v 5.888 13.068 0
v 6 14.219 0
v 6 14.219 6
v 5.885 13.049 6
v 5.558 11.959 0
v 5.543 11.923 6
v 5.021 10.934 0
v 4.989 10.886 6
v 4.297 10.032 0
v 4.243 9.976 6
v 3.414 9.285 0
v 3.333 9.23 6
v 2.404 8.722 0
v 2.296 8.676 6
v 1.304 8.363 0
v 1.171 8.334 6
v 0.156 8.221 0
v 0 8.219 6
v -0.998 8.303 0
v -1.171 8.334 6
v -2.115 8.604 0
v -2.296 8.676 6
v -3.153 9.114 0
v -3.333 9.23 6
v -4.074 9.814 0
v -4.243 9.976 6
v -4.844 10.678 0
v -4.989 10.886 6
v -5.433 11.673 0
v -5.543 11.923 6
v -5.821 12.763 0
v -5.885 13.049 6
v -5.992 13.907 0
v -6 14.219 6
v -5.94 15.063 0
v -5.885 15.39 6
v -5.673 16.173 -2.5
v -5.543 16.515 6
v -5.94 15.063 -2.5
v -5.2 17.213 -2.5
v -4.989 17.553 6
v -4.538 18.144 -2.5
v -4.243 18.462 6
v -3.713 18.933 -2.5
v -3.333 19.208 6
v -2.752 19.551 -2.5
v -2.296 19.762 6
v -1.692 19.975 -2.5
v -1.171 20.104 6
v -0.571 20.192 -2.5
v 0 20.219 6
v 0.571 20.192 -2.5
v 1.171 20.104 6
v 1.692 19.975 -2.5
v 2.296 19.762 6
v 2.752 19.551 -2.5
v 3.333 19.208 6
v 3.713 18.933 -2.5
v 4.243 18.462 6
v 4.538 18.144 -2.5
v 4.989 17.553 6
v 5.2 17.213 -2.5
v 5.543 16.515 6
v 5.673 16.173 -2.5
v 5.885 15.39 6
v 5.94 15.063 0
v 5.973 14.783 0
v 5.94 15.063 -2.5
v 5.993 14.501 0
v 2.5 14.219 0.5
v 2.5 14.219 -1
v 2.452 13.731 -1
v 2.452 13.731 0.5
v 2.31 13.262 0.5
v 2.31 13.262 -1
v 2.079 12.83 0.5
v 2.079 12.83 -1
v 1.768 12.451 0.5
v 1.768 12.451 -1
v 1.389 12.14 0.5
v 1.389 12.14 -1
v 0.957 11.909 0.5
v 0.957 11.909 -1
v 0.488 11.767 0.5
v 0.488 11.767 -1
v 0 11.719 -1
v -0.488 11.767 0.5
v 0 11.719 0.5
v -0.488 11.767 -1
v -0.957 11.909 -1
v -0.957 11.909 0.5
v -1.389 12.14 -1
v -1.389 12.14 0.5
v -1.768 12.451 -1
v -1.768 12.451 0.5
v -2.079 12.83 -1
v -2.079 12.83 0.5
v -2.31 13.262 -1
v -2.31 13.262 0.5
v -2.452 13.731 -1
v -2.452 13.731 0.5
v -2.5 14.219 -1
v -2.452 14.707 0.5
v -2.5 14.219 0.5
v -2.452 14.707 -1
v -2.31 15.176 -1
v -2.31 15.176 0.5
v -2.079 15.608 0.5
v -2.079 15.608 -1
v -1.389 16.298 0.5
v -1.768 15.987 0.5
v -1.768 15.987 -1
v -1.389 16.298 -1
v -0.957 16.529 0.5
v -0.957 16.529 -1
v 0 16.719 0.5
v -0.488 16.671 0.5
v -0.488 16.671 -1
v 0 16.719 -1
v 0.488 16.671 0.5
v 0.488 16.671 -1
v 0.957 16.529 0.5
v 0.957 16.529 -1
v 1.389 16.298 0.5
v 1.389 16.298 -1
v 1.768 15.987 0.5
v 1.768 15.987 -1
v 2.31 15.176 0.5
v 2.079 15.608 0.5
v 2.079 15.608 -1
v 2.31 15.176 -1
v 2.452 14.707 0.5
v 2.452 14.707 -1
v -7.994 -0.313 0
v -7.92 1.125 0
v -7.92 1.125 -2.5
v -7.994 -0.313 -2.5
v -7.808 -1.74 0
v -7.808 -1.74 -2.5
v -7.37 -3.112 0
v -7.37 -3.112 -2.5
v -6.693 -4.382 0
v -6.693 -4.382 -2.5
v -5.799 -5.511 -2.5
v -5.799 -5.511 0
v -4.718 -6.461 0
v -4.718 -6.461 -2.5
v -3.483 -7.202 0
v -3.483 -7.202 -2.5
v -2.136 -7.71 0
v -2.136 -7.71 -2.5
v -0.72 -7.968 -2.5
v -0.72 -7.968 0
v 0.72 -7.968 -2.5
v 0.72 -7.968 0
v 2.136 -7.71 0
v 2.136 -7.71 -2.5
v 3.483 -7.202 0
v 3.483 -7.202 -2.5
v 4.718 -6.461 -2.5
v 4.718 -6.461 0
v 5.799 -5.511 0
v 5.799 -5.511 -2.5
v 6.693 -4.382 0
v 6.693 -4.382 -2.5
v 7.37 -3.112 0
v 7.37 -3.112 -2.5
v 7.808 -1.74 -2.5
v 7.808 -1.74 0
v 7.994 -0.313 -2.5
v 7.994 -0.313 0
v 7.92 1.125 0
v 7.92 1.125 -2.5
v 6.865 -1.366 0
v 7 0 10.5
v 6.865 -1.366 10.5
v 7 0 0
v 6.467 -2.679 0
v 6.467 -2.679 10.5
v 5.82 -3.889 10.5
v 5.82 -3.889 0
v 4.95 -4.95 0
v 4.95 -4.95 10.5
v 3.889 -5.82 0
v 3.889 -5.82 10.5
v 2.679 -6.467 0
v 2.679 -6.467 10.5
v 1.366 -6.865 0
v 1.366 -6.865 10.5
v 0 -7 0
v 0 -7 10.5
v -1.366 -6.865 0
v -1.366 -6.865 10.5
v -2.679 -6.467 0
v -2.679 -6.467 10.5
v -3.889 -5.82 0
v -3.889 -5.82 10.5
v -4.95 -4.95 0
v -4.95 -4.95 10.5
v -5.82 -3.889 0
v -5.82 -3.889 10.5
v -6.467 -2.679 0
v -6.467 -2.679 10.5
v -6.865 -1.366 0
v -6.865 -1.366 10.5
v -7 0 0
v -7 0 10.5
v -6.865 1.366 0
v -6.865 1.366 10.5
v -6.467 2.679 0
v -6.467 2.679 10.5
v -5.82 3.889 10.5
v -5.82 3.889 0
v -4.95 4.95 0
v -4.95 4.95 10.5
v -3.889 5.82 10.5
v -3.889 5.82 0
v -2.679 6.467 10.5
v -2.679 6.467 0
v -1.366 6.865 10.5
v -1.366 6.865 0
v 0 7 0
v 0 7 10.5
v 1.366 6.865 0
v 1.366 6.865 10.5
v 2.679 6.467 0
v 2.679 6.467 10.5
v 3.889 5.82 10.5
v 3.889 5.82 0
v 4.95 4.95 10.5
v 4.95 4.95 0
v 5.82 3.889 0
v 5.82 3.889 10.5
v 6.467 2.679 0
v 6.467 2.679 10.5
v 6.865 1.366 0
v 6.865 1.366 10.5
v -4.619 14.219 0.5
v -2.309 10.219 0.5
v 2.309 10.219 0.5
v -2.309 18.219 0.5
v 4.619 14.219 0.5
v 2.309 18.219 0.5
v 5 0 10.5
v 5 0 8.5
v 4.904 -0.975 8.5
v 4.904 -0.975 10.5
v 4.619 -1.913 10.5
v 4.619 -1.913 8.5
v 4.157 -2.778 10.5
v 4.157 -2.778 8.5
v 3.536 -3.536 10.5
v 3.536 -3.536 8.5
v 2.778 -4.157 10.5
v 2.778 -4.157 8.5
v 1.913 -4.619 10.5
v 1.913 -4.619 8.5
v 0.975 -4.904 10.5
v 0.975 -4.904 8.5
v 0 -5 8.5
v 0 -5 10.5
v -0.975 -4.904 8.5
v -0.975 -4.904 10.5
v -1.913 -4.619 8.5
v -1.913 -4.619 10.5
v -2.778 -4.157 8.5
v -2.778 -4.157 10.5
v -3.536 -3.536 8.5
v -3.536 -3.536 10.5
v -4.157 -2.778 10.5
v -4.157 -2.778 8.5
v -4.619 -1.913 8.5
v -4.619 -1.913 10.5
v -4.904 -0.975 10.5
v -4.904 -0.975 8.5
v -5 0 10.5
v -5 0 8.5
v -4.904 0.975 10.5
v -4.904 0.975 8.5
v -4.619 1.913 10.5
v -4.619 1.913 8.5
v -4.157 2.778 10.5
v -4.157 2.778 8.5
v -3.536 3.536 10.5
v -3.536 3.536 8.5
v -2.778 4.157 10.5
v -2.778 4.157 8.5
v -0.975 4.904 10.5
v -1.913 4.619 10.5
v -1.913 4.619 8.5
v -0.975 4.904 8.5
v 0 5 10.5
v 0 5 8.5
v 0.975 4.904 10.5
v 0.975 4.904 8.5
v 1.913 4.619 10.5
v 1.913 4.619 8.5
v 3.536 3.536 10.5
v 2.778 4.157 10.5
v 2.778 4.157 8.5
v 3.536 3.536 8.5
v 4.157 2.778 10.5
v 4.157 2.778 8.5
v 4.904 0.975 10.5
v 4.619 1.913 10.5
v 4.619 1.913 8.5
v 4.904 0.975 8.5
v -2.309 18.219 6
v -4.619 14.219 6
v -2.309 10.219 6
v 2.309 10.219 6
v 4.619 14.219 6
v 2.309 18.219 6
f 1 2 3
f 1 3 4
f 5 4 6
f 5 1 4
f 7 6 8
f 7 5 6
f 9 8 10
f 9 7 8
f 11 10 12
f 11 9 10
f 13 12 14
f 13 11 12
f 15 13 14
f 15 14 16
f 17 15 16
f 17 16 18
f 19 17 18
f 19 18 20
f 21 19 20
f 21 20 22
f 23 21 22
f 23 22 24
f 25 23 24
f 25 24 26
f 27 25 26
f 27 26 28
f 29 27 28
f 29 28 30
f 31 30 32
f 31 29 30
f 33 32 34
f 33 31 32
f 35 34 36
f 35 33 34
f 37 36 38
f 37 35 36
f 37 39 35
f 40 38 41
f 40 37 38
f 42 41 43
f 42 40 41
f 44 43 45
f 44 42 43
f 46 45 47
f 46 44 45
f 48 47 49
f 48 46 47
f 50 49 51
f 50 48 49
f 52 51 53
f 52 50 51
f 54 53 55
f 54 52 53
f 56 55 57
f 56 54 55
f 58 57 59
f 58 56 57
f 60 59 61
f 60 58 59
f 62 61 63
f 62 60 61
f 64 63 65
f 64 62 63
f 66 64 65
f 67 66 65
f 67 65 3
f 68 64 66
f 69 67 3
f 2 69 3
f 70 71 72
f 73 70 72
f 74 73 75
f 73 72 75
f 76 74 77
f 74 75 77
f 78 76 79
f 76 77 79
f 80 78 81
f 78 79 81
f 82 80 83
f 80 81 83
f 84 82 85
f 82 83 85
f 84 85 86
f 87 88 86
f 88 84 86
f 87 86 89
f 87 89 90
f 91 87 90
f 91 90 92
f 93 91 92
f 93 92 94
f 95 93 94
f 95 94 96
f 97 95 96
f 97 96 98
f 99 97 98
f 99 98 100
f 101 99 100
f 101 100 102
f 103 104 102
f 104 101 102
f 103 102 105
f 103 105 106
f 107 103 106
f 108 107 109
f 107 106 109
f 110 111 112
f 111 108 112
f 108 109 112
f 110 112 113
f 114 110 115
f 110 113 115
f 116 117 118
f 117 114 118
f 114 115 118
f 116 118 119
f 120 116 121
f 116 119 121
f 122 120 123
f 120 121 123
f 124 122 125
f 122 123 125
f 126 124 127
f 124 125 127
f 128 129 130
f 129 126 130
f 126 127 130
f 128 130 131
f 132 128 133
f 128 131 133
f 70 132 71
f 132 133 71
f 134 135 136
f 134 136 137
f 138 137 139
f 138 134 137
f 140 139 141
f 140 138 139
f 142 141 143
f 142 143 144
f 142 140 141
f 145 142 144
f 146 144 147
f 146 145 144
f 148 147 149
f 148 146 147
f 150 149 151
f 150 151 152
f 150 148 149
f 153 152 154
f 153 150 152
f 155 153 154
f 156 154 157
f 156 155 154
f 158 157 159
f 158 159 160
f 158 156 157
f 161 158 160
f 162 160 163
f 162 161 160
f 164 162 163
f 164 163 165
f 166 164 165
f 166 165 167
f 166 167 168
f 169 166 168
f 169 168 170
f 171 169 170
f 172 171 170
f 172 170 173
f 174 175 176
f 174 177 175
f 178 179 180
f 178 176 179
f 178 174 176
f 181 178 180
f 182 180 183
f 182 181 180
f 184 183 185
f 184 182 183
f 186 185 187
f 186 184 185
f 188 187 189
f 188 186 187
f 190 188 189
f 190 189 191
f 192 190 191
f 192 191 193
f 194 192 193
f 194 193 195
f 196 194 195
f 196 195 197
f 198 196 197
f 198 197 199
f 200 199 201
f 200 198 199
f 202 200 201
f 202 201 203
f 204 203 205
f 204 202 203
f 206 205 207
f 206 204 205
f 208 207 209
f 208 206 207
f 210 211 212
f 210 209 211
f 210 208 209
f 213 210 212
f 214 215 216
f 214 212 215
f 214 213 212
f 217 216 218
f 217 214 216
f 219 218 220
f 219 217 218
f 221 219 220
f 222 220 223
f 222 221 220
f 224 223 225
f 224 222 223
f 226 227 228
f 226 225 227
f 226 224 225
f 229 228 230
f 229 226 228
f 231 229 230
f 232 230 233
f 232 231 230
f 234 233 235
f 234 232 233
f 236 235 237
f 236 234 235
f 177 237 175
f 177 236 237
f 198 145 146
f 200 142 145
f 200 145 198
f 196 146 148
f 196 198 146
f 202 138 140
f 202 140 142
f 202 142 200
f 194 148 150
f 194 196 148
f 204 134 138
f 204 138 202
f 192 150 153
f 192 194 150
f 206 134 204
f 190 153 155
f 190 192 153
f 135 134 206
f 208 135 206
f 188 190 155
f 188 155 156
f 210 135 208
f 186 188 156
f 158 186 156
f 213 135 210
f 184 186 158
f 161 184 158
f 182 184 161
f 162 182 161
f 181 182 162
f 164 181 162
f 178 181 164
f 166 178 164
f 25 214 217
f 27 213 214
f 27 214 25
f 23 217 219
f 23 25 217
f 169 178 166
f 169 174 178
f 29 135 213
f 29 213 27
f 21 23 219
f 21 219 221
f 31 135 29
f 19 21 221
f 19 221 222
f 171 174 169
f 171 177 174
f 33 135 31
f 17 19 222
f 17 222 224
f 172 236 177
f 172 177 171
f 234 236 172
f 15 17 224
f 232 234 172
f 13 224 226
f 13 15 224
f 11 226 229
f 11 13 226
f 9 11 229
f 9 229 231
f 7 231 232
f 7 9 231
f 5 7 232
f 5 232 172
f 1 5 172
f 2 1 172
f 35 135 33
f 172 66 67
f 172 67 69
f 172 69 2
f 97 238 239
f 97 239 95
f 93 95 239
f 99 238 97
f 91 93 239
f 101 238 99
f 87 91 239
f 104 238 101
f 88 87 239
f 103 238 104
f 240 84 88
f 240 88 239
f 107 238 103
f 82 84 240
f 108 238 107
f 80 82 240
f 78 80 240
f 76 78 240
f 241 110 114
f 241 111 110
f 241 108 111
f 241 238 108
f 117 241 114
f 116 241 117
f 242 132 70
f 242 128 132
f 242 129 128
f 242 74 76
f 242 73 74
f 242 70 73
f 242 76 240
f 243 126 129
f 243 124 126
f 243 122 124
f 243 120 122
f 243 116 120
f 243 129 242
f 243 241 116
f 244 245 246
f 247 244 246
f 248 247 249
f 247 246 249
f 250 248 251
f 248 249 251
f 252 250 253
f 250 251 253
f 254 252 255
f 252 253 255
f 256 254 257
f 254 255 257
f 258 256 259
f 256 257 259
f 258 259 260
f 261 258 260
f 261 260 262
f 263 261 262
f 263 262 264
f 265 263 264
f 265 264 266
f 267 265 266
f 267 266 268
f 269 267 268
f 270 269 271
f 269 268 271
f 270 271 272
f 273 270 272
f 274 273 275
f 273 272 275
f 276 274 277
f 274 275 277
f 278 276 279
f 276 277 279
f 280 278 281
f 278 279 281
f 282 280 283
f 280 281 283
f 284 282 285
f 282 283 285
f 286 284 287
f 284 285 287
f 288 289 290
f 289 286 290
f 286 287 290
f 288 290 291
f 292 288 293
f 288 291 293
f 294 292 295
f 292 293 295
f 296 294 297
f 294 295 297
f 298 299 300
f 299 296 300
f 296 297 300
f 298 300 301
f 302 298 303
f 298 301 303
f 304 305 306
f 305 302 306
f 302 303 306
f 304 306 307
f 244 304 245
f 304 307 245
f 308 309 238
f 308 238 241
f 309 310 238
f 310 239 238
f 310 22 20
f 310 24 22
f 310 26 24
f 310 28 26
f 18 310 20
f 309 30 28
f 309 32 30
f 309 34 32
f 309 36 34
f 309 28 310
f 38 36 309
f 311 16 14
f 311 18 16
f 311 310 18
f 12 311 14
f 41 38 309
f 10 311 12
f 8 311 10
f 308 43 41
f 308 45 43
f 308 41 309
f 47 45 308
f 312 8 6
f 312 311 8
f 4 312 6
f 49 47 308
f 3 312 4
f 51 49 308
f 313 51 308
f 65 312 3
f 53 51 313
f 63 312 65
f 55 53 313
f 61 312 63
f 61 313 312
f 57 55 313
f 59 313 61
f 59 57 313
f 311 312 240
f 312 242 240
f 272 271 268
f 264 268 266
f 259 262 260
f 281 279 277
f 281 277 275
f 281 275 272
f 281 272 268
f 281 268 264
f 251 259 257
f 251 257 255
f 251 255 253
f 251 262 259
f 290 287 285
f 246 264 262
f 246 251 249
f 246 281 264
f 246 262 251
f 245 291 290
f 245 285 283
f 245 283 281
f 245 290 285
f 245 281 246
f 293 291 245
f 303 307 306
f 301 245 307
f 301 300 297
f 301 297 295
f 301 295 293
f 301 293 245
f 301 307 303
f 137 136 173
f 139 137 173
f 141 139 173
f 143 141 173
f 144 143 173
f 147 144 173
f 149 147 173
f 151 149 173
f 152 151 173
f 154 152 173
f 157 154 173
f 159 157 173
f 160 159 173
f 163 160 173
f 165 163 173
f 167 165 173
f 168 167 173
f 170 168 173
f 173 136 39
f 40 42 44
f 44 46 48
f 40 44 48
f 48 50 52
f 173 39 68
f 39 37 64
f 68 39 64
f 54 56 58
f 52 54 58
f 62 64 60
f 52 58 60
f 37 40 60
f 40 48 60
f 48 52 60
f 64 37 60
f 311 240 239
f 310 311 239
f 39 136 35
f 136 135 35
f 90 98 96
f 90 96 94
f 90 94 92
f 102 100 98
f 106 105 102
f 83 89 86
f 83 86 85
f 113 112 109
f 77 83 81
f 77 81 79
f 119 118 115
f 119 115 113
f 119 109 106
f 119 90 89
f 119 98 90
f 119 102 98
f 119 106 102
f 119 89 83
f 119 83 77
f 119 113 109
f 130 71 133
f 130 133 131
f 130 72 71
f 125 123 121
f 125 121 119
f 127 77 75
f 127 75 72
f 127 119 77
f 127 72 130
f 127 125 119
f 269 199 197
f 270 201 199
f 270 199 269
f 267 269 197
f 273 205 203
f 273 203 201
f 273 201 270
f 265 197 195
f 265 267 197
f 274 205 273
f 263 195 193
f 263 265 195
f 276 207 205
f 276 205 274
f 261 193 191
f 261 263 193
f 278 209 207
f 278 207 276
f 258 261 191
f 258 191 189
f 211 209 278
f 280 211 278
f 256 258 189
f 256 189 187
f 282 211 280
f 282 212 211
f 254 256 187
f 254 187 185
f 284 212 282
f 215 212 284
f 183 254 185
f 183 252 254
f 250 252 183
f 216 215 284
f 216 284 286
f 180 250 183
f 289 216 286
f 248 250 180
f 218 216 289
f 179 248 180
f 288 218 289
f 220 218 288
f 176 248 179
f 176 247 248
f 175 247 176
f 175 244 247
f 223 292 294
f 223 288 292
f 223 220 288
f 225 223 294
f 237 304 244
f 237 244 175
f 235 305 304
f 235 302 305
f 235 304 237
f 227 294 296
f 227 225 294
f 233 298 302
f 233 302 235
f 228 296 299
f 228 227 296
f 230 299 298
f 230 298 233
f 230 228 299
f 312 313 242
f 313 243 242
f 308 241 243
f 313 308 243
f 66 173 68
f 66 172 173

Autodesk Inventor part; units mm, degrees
ref_plane "YZ Plane" through (0, 0, 0) normal (1, 0, 0) x (0, 1, 0)
ref_plane "XZ Plane" through (0, 0, 0) normal (0, 1, 0) x (-1, 0, 0)
ref_plane "XY Plane" through (0, 0, 0) normal (0, 0, 1) x (1, 0, 0)
sketch "Эскиз1" plane through (0, 0, 0) normal (0, 0, 1) x (1, 0, 0)
  arc A0 (-7.9205, 1.1252) -> (7.9205, 1.1252) centre (0, 0) ccw
  circle A1 centre (0, 14.2191) radius 6
  line L0 (7.9205, 1.1252) -> (5.9404, 15.0631)
  line L1 (-7.9205, 1.1252) -> (-5.9404, 15.0631)
  circle A2 centre (0, 0) radius 7
  arc A3 (7.9205, 1.1252) -> (-7.9205, 1.1252) centre (0, 0) ccw construction
  circle A4 centre (0, 14.2191) radius 2.5
  line L2 (2.3094, 18.2191) -> (4.6188, 14.2191)
  line L3 (4.6188, 14.2191) -> (2.3094, 10.2191)
  line L4 (2.3094, 10.2191) -> (-2.3094, 10.2191)
  line L5 (-2.3094, 10.2191) -> (-4.6188, 14.2191)
  line L6 (-4.6188, 14.2191) -> (-2.3094, 18.2191)
  line L7 (-2.3094, 18.2191) -> (2.3094, 18.2191)
  circle A5 centre (0, 0) radius 5
  point P0 (-5.6643, 4.1129)
  point P1 (-6.8918, 1.226)
  point P2 (-6.9958, -0.2431)
  point P3 (-5.2611, 17.1038)
  point P4 (-5.7507, 15.9307)
  point P5 (-5.9065, 15.2742)
extrude "Выдавливание1" add sketch "Эскиз1" against normal blind 2.5 contours L1 A1 L0 A0 | A1 | A2 | A4 | L2 L3 L4 L5 L6 L7 | A5
extrude "Выдавливание2" cut sketch "Эскиз1" against normal blind 1 contours A4
extrude "Выдавливание3" add sketch "Эскиз1" along normal blind 6 contours A1
extrude "Выдавливание4" add sketch "Эскиз1" along normal blind 0.5 contours L2 L3 L4 L5 L6 L7
extrude "Выдавливание5" add sketch "Эскиз1" along normal blind 10.5 contours A2
extrude "Выдавливание7" add sketch "Эскиз1" along normal blind 8.5 contours A5
properties part number "Капсула"
